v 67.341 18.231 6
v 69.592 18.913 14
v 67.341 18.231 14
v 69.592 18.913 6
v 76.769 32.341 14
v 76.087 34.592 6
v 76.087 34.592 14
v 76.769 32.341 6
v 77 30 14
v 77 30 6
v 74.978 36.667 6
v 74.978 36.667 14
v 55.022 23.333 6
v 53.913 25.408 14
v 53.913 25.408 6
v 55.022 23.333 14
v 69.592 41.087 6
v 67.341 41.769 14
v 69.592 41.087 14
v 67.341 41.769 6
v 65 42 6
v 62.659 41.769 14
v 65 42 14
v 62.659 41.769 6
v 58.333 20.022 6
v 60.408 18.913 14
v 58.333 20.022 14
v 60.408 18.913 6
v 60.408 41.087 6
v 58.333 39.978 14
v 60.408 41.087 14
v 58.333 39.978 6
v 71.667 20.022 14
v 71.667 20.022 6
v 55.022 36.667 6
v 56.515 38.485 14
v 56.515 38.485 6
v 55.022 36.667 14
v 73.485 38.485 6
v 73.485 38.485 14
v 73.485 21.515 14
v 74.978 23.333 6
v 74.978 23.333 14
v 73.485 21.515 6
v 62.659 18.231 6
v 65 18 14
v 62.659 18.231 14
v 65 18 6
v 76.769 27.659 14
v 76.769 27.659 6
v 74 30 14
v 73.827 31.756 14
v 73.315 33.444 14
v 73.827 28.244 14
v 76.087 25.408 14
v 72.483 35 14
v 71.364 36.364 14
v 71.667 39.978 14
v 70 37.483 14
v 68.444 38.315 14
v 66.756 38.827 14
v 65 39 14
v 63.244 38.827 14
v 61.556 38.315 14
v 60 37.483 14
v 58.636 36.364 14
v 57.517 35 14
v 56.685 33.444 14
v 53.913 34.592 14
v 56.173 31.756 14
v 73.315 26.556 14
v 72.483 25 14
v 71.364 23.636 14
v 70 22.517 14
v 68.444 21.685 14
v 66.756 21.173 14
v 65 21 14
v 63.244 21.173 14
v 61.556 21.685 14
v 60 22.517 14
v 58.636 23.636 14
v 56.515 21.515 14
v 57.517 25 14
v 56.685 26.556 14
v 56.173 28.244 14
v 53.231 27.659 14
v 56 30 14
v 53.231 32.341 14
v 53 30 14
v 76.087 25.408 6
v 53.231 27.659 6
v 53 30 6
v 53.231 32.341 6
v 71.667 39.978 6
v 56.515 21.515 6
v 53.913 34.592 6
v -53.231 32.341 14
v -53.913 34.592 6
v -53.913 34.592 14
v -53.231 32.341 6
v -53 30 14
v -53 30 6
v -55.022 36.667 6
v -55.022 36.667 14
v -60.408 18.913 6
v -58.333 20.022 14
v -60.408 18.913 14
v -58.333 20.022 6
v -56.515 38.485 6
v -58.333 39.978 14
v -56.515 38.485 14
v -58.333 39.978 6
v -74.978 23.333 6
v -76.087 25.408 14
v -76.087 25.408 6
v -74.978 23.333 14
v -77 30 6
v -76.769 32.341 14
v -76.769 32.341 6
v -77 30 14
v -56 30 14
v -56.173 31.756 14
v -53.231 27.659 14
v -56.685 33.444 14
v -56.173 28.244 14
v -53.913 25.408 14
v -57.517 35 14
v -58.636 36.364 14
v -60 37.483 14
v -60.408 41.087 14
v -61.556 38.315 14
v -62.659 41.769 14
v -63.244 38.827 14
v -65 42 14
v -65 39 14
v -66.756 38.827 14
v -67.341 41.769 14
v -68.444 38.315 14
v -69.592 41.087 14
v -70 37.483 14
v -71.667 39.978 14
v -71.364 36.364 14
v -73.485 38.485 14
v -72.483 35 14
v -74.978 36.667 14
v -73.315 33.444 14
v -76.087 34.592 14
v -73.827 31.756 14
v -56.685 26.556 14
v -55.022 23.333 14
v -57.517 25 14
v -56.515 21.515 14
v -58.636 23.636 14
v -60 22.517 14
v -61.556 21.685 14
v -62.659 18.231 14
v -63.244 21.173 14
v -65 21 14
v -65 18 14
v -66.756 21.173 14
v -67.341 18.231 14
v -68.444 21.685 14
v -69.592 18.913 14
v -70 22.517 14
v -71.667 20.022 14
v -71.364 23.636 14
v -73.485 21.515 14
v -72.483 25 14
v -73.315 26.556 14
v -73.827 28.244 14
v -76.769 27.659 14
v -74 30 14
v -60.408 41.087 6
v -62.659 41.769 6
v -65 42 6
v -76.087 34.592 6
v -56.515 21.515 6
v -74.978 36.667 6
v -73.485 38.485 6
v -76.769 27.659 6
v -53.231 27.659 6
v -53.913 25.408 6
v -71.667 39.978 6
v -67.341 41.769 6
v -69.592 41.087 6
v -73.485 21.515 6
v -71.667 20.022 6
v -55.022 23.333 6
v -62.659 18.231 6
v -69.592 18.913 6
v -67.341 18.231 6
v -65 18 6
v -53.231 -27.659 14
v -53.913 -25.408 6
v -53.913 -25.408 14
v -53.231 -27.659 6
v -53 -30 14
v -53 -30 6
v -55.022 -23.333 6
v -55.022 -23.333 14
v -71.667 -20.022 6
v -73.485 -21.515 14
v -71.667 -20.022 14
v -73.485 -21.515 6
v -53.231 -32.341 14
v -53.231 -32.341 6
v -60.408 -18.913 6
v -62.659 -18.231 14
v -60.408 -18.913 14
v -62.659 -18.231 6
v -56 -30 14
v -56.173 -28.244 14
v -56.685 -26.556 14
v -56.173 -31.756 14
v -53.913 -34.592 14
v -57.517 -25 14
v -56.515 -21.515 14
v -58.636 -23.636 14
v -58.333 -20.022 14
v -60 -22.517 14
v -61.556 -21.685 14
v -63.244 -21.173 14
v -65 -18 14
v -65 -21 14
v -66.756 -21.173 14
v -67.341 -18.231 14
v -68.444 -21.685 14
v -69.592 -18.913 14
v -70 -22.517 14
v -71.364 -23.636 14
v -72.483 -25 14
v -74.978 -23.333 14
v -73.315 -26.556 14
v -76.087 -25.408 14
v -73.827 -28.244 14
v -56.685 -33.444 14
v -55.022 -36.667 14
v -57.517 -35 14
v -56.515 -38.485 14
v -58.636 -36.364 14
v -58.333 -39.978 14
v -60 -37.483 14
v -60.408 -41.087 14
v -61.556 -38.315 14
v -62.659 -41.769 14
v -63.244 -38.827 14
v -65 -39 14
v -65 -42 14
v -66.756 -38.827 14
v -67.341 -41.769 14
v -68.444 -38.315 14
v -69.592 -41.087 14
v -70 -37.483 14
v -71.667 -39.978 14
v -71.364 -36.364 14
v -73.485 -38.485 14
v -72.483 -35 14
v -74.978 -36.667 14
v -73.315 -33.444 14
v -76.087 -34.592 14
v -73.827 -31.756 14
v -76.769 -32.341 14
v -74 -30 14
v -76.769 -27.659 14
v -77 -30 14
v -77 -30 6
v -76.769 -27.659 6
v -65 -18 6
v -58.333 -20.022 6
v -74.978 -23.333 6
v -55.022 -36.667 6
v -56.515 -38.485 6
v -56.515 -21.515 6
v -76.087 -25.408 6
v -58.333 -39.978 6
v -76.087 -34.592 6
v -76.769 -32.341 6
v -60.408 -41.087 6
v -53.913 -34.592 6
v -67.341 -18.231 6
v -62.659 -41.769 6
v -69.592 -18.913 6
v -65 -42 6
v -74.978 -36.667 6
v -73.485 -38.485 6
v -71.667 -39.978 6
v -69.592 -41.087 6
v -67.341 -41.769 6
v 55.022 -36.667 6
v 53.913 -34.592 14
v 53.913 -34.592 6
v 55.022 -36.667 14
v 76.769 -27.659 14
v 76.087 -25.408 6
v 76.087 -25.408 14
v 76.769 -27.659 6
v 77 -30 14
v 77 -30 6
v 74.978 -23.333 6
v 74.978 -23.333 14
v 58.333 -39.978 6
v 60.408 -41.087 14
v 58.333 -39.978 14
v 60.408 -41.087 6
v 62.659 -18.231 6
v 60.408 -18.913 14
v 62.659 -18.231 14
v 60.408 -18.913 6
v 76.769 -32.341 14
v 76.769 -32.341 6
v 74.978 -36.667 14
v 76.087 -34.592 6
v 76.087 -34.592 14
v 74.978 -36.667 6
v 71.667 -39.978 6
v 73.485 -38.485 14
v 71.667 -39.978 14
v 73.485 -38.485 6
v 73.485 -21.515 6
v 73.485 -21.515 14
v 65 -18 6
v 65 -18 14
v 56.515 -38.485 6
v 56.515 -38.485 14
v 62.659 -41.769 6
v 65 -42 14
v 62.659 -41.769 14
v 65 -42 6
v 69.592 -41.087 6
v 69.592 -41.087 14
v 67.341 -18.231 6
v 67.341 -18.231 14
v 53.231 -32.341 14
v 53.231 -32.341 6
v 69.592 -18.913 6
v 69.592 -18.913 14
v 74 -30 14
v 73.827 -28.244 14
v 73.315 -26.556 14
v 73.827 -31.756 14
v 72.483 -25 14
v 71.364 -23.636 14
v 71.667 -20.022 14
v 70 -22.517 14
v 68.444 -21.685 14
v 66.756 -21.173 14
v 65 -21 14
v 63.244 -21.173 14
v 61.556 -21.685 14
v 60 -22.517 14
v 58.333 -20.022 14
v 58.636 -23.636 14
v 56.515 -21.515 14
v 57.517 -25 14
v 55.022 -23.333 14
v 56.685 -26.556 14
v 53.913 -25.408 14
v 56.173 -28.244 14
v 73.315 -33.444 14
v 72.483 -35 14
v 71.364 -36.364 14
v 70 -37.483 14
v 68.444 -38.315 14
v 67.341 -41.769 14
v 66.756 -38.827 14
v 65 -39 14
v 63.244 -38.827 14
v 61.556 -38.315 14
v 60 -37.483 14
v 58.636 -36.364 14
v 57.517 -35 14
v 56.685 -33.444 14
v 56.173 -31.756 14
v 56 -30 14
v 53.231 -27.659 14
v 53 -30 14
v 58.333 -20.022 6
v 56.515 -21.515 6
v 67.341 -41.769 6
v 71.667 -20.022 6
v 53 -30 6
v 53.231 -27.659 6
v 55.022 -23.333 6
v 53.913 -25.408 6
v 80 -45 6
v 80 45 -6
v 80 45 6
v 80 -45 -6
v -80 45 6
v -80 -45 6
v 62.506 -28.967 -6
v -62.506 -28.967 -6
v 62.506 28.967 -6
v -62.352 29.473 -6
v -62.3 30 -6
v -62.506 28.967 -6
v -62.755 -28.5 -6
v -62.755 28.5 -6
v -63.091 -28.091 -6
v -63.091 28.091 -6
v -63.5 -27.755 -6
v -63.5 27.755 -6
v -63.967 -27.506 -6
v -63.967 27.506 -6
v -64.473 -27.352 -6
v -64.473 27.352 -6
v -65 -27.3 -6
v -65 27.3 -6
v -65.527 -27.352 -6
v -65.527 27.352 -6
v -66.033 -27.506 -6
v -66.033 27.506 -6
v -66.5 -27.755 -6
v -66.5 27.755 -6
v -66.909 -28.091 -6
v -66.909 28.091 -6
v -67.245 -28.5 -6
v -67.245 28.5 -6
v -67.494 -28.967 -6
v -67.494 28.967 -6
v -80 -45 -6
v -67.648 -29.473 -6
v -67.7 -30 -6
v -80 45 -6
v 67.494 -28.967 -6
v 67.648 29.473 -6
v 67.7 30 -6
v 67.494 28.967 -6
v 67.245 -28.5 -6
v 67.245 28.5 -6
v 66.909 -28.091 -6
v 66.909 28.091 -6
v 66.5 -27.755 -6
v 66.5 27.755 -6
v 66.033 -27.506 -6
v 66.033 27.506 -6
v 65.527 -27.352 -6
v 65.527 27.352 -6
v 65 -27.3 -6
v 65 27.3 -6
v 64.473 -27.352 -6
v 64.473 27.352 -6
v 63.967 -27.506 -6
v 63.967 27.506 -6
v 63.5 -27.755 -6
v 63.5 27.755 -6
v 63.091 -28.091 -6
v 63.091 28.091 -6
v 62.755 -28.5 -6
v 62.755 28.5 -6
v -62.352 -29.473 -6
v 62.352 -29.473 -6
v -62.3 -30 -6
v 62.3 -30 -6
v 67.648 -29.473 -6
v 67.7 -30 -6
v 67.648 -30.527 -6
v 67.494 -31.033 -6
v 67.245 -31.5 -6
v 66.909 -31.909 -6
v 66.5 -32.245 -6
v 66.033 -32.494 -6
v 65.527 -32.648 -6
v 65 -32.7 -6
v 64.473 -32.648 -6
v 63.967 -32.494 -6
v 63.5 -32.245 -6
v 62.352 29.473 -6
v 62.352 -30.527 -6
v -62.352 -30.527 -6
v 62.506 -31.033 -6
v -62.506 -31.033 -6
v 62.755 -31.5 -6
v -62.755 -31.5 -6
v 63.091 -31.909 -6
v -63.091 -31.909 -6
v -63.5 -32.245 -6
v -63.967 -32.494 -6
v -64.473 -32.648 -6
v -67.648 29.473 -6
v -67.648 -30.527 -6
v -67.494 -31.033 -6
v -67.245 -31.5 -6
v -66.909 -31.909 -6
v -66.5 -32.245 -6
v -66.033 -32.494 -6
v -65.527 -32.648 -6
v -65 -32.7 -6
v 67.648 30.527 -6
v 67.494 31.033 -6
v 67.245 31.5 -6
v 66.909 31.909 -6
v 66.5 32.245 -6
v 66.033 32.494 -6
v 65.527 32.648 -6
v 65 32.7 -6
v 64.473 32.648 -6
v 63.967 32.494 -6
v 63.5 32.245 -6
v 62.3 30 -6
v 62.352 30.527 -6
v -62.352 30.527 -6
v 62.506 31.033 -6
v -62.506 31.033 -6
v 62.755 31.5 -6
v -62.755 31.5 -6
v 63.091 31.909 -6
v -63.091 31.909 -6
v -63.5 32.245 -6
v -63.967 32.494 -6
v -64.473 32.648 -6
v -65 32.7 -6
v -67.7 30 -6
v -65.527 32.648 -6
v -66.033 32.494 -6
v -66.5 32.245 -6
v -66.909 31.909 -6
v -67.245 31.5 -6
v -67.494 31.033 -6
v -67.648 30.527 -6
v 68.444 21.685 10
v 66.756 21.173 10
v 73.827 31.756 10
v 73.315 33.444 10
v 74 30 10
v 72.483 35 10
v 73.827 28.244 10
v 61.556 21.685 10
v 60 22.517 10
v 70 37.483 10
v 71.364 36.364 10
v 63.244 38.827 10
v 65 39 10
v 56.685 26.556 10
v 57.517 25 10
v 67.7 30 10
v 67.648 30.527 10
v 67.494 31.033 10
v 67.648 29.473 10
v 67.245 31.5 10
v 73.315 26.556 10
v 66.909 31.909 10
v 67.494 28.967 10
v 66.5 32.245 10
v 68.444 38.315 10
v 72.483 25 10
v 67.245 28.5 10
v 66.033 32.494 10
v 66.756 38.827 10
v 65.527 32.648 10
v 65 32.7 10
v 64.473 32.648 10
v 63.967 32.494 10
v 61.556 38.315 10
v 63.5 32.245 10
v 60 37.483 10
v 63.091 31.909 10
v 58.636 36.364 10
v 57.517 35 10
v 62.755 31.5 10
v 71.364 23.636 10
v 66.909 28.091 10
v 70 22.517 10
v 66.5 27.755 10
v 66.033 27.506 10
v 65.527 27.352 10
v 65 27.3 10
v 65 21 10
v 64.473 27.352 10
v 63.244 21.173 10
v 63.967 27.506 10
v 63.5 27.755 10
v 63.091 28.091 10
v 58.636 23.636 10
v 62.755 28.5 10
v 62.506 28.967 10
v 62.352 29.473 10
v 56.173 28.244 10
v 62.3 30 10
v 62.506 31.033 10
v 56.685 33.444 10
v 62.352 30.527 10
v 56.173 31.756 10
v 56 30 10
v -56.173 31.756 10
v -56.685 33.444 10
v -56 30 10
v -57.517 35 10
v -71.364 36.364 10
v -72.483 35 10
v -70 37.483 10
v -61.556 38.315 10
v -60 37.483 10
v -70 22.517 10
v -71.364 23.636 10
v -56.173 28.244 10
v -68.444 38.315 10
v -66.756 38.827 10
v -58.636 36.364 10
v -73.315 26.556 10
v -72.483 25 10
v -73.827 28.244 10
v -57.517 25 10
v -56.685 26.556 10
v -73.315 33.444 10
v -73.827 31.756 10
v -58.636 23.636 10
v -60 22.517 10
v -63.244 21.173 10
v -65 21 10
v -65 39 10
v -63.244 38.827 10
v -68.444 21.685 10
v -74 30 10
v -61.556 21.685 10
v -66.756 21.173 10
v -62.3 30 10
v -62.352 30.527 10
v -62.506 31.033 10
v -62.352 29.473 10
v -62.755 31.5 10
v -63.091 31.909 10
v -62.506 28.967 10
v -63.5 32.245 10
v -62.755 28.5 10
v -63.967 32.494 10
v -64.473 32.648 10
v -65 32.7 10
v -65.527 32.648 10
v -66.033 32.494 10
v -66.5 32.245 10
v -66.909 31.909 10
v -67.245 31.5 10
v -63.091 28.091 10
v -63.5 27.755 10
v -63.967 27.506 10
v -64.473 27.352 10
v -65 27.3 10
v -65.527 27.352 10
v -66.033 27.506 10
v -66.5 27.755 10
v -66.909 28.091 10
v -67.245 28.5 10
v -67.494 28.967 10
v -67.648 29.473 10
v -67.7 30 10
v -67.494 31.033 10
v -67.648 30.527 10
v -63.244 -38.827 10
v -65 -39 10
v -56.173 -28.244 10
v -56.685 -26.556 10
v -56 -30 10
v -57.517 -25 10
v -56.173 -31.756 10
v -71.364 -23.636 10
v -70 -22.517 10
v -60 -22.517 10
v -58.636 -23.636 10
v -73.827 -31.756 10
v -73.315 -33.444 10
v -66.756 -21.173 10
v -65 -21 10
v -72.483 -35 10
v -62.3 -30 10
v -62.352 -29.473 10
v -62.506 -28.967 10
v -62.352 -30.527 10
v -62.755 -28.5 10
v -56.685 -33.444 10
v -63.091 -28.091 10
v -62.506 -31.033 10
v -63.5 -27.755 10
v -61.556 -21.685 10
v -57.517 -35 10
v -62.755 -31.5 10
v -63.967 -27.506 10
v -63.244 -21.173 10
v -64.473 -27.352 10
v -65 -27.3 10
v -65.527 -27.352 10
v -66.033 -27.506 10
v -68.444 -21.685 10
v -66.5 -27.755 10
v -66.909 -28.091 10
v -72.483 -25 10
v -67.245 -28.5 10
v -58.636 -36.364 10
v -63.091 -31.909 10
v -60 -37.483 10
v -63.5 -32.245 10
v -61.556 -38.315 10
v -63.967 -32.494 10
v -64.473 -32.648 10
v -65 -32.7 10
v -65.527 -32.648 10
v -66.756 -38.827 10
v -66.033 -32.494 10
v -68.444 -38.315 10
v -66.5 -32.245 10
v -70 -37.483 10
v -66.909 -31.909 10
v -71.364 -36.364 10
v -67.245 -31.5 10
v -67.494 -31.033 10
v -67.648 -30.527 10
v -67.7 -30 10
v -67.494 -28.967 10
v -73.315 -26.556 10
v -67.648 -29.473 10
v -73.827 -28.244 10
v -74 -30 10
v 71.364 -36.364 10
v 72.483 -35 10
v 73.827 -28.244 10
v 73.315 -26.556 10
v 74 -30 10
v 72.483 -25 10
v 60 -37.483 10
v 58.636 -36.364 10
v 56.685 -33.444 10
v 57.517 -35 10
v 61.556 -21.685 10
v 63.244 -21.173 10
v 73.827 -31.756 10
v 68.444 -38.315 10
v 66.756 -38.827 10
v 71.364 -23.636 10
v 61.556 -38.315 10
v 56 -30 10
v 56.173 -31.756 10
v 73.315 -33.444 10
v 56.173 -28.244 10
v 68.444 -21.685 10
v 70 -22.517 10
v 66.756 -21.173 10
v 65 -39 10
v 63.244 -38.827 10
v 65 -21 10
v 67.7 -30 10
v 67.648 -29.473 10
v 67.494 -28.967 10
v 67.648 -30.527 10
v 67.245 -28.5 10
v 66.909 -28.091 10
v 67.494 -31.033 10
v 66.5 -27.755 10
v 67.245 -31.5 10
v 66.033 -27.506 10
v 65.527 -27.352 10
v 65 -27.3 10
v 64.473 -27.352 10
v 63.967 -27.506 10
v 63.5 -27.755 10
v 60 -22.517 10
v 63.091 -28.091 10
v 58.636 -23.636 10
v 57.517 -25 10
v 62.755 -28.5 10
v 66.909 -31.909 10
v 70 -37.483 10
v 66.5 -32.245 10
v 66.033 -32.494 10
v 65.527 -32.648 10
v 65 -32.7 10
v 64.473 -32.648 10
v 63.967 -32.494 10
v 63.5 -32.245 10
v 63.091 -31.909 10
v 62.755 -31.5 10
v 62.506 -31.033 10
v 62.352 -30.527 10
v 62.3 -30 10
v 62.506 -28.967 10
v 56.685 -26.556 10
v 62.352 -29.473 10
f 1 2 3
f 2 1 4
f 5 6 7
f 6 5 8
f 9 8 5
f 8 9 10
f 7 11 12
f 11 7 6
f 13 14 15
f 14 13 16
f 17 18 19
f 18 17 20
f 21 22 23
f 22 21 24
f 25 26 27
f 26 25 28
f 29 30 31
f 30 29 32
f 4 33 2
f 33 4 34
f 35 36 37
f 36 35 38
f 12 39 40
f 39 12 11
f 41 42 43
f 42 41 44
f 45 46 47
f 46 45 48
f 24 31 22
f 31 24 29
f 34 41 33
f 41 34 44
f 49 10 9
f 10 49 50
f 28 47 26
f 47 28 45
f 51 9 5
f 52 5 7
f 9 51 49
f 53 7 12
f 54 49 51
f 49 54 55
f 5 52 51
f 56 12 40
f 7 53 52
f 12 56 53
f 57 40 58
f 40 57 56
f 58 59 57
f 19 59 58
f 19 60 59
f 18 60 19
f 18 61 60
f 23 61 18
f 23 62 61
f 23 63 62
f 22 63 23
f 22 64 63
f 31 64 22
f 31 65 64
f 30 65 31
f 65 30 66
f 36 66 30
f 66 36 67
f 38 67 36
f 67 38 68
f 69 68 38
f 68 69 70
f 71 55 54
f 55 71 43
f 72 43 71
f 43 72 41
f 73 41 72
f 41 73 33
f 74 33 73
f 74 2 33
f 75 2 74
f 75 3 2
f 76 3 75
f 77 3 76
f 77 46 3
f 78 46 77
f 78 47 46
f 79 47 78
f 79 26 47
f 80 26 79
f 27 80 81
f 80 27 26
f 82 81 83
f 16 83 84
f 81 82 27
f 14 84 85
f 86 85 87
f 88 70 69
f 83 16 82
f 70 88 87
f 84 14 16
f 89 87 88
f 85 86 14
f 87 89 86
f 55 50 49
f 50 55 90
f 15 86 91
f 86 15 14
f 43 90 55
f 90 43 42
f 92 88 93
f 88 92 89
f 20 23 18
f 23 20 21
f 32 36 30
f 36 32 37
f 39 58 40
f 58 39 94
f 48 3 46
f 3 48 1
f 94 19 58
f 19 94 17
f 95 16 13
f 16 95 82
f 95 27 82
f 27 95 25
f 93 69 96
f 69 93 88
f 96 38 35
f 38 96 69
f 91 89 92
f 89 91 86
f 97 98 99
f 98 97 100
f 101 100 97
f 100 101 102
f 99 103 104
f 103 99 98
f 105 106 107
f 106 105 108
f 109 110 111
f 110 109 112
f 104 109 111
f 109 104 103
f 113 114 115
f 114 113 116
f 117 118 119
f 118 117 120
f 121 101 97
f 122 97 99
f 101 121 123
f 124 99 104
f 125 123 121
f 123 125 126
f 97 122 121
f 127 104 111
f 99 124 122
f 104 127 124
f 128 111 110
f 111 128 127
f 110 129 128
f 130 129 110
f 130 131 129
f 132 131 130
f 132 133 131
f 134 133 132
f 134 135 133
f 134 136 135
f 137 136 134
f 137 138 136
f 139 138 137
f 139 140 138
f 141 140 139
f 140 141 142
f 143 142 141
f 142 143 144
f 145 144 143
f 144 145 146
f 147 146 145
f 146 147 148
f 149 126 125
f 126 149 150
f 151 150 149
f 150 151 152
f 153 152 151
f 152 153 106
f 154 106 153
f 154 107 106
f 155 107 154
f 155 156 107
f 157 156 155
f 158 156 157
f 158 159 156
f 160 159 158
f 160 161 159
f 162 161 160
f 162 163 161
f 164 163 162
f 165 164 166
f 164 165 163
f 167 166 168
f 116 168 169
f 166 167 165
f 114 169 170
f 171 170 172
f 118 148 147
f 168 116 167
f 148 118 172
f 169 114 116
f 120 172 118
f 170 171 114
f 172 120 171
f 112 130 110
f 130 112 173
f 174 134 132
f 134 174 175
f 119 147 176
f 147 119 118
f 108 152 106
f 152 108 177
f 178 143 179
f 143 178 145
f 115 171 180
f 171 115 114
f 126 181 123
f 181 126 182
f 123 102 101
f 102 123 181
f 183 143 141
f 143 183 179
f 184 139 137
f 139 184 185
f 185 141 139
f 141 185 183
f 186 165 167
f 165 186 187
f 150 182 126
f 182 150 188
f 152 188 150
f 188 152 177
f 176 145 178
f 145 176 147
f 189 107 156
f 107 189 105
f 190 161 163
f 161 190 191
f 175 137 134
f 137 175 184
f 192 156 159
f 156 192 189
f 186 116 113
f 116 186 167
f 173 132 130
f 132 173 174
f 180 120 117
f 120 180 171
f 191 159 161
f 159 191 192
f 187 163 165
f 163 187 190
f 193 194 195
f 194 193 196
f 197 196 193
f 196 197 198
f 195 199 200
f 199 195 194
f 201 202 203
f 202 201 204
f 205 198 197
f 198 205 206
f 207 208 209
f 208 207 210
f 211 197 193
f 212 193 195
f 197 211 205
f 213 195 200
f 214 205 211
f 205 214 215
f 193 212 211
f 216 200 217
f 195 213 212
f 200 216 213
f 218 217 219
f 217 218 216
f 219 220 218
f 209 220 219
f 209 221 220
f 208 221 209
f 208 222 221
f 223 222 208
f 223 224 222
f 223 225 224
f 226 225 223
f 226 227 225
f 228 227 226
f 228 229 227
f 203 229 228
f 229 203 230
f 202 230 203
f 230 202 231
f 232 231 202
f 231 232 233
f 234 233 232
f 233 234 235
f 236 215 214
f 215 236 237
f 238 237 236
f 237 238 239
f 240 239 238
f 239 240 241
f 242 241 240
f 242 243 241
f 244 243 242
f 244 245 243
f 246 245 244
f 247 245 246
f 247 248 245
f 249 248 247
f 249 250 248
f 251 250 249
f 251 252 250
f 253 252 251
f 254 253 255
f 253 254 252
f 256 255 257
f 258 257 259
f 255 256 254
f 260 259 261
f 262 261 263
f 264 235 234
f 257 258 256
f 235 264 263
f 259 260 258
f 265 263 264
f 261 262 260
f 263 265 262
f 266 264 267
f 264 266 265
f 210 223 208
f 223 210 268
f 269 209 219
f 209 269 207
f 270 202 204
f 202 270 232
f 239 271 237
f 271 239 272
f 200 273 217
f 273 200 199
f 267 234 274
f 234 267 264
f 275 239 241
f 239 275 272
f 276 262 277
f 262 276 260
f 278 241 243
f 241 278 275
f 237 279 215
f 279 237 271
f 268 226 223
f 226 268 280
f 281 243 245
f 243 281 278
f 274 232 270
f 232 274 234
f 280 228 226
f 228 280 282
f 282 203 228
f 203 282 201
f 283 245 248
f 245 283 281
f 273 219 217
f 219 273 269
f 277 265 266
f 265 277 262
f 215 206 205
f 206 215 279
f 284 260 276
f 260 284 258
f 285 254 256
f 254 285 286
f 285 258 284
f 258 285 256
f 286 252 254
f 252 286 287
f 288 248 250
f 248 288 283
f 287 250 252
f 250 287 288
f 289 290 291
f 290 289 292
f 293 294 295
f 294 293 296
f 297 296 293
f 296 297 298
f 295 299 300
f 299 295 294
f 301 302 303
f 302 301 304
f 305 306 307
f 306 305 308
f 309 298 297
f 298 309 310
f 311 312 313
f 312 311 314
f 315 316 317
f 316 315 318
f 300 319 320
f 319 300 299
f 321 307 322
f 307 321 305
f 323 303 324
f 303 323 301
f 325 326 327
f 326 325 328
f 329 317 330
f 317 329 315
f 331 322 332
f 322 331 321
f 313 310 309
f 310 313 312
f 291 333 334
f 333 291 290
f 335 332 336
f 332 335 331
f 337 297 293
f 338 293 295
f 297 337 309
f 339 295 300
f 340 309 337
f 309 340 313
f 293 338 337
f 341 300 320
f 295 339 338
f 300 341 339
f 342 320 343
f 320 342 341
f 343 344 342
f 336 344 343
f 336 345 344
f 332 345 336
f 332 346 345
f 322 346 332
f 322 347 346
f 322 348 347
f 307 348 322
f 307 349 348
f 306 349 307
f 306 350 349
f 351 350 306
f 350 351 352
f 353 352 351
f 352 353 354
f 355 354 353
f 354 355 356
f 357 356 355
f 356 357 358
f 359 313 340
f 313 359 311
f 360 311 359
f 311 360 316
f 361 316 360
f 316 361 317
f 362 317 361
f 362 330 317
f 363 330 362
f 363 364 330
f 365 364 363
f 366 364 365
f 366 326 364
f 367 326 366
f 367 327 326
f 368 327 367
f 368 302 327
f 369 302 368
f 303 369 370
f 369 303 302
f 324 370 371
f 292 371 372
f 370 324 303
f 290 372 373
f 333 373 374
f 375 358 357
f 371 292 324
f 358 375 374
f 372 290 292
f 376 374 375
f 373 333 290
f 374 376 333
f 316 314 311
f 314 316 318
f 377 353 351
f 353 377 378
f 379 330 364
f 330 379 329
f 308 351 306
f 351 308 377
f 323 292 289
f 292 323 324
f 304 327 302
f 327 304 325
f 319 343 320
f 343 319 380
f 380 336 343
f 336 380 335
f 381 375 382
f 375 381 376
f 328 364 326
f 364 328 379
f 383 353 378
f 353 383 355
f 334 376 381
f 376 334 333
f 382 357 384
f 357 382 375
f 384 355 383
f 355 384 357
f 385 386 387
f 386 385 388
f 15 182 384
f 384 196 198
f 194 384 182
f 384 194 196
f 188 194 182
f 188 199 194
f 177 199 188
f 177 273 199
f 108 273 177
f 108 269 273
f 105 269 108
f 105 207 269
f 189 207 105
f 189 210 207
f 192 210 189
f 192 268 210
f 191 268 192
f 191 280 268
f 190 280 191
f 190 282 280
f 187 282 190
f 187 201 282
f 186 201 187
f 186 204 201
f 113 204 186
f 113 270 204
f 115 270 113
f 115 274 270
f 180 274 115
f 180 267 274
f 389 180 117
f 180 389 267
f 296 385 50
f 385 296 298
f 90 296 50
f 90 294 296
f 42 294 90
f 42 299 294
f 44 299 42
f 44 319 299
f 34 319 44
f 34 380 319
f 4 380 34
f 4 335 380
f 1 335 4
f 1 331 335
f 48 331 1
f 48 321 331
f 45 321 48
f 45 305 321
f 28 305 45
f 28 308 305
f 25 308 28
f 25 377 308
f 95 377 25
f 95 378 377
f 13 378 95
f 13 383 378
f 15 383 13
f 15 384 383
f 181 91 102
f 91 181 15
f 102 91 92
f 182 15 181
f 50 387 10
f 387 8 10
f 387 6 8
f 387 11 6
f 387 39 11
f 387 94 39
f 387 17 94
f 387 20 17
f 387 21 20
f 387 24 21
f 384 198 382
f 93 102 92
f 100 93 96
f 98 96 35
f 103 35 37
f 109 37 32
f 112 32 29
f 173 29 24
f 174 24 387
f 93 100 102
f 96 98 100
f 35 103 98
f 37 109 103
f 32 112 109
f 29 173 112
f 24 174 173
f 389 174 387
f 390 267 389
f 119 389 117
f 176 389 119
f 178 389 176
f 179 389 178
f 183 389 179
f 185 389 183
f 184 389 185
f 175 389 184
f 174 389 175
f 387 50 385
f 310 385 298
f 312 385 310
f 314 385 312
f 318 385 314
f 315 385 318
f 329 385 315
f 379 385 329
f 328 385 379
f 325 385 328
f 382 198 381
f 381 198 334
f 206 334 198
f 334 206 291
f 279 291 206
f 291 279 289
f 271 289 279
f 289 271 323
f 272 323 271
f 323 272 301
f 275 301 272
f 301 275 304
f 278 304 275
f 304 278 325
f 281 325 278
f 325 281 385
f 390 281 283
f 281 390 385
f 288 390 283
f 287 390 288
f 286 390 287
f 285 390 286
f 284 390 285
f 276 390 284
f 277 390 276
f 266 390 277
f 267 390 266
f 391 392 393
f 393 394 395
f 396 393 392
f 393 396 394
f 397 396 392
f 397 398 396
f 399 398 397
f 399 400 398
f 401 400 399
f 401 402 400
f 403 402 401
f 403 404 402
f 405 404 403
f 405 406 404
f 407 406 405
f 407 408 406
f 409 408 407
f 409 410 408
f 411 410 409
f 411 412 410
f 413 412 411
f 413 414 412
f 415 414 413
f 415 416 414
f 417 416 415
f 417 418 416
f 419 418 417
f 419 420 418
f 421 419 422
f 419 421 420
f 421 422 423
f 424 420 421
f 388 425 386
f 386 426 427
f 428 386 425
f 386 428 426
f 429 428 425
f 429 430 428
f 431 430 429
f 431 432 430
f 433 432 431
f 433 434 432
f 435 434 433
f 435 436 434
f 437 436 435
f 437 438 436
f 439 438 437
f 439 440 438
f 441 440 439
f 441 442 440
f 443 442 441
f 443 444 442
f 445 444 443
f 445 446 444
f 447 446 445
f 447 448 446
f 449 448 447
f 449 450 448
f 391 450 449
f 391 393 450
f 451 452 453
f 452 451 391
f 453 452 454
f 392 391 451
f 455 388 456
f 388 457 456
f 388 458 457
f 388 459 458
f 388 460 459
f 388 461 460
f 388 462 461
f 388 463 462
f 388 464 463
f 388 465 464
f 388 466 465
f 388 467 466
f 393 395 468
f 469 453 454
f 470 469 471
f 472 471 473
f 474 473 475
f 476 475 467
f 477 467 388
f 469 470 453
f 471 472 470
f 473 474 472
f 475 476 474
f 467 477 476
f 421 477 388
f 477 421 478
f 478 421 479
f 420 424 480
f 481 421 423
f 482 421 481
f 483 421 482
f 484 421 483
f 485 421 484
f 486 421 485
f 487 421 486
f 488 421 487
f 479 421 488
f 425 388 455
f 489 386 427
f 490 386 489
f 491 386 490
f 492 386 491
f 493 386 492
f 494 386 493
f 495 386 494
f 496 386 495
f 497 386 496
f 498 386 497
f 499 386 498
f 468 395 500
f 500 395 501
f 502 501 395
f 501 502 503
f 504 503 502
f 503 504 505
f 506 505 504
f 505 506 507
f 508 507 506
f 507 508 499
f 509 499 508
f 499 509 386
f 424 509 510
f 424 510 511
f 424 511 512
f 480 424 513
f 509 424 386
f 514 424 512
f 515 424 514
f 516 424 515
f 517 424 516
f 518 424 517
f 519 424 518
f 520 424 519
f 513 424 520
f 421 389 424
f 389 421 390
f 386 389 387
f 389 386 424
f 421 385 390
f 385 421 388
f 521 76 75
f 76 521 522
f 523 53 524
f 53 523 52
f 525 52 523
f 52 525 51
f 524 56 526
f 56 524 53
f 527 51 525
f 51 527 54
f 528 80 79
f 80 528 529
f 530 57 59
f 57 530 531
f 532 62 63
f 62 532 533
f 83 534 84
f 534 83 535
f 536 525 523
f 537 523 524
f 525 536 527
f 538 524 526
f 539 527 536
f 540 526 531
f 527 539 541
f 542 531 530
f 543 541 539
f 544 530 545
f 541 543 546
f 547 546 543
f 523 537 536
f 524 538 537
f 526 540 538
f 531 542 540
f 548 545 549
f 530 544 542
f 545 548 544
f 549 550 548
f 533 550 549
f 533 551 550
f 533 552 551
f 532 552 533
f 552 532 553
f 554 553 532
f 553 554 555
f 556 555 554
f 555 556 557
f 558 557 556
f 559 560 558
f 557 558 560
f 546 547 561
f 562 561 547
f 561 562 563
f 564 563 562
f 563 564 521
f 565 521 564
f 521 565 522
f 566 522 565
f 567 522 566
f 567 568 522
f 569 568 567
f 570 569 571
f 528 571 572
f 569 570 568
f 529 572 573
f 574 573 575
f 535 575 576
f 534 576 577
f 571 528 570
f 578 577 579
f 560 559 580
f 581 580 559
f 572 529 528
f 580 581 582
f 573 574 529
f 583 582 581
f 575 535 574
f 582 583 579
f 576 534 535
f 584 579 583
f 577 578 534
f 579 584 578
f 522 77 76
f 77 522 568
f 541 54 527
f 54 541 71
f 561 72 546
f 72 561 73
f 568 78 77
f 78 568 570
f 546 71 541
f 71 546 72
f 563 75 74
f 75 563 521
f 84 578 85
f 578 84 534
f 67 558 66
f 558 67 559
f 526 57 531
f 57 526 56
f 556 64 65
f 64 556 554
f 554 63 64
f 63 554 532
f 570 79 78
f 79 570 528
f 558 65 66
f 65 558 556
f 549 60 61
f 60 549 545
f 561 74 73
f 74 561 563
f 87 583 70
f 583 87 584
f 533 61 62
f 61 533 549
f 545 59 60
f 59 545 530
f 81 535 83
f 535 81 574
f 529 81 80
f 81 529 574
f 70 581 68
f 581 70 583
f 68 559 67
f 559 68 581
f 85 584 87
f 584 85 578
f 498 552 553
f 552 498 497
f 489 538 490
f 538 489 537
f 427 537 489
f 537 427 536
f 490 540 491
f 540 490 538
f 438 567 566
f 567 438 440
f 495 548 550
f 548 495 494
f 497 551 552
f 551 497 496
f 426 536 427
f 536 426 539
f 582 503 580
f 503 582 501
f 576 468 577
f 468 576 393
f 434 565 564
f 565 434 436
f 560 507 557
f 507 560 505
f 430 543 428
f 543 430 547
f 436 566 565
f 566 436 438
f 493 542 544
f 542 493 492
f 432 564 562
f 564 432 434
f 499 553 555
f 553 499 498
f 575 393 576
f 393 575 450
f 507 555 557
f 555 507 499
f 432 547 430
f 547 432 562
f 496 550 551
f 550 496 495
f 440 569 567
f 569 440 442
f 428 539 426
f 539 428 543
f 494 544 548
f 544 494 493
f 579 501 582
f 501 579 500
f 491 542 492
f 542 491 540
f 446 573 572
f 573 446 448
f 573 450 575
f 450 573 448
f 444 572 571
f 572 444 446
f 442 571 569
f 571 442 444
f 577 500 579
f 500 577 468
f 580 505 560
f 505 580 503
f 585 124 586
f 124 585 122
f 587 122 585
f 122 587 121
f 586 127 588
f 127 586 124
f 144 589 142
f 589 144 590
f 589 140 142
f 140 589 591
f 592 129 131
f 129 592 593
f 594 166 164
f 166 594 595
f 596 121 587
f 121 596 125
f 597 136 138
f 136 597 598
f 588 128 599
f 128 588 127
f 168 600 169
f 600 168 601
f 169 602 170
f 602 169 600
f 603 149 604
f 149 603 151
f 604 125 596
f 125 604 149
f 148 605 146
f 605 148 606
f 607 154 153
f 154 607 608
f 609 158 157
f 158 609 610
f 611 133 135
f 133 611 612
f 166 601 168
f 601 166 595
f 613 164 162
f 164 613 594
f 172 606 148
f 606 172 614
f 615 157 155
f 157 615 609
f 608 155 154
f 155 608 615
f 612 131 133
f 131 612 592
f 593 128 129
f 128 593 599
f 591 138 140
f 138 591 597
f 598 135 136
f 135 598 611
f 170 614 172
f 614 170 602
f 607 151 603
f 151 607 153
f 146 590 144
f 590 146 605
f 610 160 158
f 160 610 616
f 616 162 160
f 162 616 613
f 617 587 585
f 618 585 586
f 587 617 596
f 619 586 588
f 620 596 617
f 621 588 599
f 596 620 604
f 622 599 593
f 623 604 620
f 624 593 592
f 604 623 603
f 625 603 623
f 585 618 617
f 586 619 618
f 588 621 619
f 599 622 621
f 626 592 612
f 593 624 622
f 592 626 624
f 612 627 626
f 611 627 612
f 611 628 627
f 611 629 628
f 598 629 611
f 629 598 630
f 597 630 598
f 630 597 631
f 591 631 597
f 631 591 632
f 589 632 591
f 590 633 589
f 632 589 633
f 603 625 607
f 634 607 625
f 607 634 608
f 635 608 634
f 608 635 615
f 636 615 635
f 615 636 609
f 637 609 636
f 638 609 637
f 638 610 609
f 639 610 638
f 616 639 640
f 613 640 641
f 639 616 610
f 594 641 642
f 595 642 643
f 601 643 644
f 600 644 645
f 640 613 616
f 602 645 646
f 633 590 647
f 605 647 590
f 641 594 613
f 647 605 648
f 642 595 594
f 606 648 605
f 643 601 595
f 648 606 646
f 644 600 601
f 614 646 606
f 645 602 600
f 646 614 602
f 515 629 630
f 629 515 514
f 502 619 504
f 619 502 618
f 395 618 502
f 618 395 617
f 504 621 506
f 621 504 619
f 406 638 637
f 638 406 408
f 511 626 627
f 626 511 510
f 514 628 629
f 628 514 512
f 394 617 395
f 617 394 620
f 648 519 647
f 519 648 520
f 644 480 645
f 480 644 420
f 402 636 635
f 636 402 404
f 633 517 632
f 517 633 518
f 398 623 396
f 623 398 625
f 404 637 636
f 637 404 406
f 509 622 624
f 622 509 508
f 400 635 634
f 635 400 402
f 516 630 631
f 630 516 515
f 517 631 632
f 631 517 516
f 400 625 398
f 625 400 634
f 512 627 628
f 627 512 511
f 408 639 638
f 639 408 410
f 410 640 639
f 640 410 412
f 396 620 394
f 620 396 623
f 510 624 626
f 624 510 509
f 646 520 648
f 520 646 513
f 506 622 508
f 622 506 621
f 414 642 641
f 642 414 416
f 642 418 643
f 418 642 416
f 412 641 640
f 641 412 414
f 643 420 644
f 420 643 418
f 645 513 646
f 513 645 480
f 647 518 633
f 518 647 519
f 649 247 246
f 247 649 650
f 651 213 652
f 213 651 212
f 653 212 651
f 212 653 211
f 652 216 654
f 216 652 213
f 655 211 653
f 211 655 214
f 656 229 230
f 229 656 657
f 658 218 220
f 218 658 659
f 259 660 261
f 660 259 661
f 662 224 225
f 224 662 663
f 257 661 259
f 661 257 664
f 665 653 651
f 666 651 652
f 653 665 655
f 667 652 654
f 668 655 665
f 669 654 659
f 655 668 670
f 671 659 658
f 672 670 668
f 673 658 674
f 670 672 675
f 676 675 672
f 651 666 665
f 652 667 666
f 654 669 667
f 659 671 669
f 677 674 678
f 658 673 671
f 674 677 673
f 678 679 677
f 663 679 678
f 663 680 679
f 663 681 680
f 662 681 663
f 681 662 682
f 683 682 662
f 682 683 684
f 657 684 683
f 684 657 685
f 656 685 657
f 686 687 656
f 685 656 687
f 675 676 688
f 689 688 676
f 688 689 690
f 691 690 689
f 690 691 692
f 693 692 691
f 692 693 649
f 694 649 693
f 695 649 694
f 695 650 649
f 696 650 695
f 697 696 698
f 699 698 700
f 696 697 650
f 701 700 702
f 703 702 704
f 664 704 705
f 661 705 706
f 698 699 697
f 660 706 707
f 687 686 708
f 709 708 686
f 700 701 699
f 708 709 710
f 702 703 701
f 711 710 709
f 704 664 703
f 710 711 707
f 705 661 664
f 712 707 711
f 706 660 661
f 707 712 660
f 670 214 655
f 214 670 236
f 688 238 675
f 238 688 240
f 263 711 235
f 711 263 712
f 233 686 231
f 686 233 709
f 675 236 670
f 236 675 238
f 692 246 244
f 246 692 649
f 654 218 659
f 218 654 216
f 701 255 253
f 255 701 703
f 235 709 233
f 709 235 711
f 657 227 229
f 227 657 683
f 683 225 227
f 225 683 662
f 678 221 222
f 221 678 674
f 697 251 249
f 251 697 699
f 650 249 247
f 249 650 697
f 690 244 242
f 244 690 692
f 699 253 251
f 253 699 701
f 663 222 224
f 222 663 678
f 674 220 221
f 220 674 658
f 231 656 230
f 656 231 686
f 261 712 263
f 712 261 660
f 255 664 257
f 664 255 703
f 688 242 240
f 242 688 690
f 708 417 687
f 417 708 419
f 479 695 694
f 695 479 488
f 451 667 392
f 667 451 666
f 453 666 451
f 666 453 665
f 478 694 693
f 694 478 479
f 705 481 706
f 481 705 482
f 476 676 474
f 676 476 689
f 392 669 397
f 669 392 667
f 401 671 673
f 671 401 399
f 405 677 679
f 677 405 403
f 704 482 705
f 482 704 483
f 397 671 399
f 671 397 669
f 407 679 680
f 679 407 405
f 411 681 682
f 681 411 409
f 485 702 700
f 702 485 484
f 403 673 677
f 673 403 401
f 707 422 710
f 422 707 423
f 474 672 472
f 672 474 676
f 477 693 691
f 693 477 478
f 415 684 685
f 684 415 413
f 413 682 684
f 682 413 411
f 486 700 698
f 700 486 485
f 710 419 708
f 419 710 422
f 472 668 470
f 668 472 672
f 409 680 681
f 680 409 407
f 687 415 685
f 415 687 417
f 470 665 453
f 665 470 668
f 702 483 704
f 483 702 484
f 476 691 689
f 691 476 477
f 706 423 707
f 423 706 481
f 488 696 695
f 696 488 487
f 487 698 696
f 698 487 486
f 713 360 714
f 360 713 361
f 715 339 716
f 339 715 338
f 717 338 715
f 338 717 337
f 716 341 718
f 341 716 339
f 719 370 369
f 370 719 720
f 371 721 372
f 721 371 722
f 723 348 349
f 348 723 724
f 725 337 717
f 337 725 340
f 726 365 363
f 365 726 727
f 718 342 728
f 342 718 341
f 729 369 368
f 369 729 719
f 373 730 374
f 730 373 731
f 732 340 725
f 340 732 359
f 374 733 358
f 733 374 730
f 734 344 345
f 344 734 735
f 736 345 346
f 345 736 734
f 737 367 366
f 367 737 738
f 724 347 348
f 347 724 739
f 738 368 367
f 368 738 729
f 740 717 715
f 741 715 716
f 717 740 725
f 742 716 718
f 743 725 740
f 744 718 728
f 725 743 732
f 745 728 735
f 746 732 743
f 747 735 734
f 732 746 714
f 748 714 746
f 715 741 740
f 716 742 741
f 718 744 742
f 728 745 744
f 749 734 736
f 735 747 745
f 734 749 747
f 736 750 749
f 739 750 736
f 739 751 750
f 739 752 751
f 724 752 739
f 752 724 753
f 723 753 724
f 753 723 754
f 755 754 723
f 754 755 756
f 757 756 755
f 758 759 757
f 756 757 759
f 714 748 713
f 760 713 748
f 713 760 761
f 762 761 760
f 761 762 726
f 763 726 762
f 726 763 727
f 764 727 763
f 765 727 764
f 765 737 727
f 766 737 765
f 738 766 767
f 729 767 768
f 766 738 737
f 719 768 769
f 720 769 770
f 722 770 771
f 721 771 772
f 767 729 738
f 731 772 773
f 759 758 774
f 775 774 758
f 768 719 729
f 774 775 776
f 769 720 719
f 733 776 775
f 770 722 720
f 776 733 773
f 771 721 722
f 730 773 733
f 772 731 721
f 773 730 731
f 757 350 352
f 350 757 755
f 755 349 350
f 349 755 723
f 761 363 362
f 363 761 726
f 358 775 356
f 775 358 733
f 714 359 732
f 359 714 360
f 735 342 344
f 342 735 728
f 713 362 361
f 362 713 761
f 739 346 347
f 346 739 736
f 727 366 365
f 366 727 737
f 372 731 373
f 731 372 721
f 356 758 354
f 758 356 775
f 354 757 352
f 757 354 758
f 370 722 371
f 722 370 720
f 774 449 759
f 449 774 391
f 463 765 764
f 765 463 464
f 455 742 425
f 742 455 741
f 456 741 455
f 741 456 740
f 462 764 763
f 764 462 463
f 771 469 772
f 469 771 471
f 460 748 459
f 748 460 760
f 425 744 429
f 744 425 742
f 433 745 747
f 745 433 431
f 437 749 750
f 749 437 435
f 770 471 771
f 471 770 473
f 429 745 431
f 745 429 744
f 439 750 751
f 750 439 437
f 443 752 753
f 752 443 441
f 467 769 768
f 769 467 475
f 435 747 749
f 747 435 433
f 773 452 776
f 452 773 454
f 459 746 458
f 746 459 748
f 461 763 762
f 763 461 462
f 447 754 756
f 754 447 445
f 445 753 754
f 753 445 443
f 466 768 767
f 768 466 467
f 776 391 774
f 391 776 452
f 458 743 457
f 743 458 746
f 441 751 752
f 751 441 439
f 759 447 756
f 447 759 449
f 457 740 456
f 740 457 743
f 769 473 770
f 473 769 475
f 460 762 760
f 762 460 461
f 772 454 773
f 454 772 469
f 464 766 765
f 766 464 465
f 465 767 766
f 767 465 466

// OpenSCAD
$fn = 32;

// ----------------------------------------------------------------------
// Socket pad plate
// bosses with counterbored sockets for the screws
// ----------------------------------------------------------------------

// --- parameters (mm) ---
base_t = 12;            // base plate thickness
boss_h = 8;             // boss height above the base plate
boss_d = 24;            // boss diameter
socket_d = 18;          // socket diameter
socket_depth = 4;       // socket depth from the boss face
bolt_d = 5.4;           // screw clearance hole through the socket floor
plate = [160, 90, 12];  // overall size (x, y, z)
edge = 15;              // boss centre offset from the plate edge
pads = 4;               // boss count, one per corner

// --- derived feature positions (mm) ---
height = base_t + boss_h;        // = 20   overall height of the part
corner_x = plate[0] / 2 - edge;  // = 65   boss centre X
corner_y = plate[1] / 2 - edge;  // = 30   boss centre Y
feature_centers = [
  [corner_x, corner_y],
  [-corner_x, corner_y],
  [-corner_x, -corner_y],
  [corner_x, -corner_y]
];   // boss centres: sockets, holes and the pads themselves are placed from here

// base plate, bosses on feature_centers, socket + through hole in each
difference() {
  union() {
    cube(plate, center = true);
    for (centre = feature_centers)
      translate([centre[0], centre[1], plate[2] / 2 - 1])
        cylinder(d = boss_d, h = boss_h + 1);
  }
  for (centre = feature_centers) {
    translate([centre[0], centre[1], plate[2] / 2 + boss_h - socket_depth])
      cylinder(d = socket_d, h = socket_depth + 1);
    translate([centre[0], centre[1], -height])
      cylinder(d = bolt_d, h = 2 * height + 2);  // through the socket floor
  }
}
